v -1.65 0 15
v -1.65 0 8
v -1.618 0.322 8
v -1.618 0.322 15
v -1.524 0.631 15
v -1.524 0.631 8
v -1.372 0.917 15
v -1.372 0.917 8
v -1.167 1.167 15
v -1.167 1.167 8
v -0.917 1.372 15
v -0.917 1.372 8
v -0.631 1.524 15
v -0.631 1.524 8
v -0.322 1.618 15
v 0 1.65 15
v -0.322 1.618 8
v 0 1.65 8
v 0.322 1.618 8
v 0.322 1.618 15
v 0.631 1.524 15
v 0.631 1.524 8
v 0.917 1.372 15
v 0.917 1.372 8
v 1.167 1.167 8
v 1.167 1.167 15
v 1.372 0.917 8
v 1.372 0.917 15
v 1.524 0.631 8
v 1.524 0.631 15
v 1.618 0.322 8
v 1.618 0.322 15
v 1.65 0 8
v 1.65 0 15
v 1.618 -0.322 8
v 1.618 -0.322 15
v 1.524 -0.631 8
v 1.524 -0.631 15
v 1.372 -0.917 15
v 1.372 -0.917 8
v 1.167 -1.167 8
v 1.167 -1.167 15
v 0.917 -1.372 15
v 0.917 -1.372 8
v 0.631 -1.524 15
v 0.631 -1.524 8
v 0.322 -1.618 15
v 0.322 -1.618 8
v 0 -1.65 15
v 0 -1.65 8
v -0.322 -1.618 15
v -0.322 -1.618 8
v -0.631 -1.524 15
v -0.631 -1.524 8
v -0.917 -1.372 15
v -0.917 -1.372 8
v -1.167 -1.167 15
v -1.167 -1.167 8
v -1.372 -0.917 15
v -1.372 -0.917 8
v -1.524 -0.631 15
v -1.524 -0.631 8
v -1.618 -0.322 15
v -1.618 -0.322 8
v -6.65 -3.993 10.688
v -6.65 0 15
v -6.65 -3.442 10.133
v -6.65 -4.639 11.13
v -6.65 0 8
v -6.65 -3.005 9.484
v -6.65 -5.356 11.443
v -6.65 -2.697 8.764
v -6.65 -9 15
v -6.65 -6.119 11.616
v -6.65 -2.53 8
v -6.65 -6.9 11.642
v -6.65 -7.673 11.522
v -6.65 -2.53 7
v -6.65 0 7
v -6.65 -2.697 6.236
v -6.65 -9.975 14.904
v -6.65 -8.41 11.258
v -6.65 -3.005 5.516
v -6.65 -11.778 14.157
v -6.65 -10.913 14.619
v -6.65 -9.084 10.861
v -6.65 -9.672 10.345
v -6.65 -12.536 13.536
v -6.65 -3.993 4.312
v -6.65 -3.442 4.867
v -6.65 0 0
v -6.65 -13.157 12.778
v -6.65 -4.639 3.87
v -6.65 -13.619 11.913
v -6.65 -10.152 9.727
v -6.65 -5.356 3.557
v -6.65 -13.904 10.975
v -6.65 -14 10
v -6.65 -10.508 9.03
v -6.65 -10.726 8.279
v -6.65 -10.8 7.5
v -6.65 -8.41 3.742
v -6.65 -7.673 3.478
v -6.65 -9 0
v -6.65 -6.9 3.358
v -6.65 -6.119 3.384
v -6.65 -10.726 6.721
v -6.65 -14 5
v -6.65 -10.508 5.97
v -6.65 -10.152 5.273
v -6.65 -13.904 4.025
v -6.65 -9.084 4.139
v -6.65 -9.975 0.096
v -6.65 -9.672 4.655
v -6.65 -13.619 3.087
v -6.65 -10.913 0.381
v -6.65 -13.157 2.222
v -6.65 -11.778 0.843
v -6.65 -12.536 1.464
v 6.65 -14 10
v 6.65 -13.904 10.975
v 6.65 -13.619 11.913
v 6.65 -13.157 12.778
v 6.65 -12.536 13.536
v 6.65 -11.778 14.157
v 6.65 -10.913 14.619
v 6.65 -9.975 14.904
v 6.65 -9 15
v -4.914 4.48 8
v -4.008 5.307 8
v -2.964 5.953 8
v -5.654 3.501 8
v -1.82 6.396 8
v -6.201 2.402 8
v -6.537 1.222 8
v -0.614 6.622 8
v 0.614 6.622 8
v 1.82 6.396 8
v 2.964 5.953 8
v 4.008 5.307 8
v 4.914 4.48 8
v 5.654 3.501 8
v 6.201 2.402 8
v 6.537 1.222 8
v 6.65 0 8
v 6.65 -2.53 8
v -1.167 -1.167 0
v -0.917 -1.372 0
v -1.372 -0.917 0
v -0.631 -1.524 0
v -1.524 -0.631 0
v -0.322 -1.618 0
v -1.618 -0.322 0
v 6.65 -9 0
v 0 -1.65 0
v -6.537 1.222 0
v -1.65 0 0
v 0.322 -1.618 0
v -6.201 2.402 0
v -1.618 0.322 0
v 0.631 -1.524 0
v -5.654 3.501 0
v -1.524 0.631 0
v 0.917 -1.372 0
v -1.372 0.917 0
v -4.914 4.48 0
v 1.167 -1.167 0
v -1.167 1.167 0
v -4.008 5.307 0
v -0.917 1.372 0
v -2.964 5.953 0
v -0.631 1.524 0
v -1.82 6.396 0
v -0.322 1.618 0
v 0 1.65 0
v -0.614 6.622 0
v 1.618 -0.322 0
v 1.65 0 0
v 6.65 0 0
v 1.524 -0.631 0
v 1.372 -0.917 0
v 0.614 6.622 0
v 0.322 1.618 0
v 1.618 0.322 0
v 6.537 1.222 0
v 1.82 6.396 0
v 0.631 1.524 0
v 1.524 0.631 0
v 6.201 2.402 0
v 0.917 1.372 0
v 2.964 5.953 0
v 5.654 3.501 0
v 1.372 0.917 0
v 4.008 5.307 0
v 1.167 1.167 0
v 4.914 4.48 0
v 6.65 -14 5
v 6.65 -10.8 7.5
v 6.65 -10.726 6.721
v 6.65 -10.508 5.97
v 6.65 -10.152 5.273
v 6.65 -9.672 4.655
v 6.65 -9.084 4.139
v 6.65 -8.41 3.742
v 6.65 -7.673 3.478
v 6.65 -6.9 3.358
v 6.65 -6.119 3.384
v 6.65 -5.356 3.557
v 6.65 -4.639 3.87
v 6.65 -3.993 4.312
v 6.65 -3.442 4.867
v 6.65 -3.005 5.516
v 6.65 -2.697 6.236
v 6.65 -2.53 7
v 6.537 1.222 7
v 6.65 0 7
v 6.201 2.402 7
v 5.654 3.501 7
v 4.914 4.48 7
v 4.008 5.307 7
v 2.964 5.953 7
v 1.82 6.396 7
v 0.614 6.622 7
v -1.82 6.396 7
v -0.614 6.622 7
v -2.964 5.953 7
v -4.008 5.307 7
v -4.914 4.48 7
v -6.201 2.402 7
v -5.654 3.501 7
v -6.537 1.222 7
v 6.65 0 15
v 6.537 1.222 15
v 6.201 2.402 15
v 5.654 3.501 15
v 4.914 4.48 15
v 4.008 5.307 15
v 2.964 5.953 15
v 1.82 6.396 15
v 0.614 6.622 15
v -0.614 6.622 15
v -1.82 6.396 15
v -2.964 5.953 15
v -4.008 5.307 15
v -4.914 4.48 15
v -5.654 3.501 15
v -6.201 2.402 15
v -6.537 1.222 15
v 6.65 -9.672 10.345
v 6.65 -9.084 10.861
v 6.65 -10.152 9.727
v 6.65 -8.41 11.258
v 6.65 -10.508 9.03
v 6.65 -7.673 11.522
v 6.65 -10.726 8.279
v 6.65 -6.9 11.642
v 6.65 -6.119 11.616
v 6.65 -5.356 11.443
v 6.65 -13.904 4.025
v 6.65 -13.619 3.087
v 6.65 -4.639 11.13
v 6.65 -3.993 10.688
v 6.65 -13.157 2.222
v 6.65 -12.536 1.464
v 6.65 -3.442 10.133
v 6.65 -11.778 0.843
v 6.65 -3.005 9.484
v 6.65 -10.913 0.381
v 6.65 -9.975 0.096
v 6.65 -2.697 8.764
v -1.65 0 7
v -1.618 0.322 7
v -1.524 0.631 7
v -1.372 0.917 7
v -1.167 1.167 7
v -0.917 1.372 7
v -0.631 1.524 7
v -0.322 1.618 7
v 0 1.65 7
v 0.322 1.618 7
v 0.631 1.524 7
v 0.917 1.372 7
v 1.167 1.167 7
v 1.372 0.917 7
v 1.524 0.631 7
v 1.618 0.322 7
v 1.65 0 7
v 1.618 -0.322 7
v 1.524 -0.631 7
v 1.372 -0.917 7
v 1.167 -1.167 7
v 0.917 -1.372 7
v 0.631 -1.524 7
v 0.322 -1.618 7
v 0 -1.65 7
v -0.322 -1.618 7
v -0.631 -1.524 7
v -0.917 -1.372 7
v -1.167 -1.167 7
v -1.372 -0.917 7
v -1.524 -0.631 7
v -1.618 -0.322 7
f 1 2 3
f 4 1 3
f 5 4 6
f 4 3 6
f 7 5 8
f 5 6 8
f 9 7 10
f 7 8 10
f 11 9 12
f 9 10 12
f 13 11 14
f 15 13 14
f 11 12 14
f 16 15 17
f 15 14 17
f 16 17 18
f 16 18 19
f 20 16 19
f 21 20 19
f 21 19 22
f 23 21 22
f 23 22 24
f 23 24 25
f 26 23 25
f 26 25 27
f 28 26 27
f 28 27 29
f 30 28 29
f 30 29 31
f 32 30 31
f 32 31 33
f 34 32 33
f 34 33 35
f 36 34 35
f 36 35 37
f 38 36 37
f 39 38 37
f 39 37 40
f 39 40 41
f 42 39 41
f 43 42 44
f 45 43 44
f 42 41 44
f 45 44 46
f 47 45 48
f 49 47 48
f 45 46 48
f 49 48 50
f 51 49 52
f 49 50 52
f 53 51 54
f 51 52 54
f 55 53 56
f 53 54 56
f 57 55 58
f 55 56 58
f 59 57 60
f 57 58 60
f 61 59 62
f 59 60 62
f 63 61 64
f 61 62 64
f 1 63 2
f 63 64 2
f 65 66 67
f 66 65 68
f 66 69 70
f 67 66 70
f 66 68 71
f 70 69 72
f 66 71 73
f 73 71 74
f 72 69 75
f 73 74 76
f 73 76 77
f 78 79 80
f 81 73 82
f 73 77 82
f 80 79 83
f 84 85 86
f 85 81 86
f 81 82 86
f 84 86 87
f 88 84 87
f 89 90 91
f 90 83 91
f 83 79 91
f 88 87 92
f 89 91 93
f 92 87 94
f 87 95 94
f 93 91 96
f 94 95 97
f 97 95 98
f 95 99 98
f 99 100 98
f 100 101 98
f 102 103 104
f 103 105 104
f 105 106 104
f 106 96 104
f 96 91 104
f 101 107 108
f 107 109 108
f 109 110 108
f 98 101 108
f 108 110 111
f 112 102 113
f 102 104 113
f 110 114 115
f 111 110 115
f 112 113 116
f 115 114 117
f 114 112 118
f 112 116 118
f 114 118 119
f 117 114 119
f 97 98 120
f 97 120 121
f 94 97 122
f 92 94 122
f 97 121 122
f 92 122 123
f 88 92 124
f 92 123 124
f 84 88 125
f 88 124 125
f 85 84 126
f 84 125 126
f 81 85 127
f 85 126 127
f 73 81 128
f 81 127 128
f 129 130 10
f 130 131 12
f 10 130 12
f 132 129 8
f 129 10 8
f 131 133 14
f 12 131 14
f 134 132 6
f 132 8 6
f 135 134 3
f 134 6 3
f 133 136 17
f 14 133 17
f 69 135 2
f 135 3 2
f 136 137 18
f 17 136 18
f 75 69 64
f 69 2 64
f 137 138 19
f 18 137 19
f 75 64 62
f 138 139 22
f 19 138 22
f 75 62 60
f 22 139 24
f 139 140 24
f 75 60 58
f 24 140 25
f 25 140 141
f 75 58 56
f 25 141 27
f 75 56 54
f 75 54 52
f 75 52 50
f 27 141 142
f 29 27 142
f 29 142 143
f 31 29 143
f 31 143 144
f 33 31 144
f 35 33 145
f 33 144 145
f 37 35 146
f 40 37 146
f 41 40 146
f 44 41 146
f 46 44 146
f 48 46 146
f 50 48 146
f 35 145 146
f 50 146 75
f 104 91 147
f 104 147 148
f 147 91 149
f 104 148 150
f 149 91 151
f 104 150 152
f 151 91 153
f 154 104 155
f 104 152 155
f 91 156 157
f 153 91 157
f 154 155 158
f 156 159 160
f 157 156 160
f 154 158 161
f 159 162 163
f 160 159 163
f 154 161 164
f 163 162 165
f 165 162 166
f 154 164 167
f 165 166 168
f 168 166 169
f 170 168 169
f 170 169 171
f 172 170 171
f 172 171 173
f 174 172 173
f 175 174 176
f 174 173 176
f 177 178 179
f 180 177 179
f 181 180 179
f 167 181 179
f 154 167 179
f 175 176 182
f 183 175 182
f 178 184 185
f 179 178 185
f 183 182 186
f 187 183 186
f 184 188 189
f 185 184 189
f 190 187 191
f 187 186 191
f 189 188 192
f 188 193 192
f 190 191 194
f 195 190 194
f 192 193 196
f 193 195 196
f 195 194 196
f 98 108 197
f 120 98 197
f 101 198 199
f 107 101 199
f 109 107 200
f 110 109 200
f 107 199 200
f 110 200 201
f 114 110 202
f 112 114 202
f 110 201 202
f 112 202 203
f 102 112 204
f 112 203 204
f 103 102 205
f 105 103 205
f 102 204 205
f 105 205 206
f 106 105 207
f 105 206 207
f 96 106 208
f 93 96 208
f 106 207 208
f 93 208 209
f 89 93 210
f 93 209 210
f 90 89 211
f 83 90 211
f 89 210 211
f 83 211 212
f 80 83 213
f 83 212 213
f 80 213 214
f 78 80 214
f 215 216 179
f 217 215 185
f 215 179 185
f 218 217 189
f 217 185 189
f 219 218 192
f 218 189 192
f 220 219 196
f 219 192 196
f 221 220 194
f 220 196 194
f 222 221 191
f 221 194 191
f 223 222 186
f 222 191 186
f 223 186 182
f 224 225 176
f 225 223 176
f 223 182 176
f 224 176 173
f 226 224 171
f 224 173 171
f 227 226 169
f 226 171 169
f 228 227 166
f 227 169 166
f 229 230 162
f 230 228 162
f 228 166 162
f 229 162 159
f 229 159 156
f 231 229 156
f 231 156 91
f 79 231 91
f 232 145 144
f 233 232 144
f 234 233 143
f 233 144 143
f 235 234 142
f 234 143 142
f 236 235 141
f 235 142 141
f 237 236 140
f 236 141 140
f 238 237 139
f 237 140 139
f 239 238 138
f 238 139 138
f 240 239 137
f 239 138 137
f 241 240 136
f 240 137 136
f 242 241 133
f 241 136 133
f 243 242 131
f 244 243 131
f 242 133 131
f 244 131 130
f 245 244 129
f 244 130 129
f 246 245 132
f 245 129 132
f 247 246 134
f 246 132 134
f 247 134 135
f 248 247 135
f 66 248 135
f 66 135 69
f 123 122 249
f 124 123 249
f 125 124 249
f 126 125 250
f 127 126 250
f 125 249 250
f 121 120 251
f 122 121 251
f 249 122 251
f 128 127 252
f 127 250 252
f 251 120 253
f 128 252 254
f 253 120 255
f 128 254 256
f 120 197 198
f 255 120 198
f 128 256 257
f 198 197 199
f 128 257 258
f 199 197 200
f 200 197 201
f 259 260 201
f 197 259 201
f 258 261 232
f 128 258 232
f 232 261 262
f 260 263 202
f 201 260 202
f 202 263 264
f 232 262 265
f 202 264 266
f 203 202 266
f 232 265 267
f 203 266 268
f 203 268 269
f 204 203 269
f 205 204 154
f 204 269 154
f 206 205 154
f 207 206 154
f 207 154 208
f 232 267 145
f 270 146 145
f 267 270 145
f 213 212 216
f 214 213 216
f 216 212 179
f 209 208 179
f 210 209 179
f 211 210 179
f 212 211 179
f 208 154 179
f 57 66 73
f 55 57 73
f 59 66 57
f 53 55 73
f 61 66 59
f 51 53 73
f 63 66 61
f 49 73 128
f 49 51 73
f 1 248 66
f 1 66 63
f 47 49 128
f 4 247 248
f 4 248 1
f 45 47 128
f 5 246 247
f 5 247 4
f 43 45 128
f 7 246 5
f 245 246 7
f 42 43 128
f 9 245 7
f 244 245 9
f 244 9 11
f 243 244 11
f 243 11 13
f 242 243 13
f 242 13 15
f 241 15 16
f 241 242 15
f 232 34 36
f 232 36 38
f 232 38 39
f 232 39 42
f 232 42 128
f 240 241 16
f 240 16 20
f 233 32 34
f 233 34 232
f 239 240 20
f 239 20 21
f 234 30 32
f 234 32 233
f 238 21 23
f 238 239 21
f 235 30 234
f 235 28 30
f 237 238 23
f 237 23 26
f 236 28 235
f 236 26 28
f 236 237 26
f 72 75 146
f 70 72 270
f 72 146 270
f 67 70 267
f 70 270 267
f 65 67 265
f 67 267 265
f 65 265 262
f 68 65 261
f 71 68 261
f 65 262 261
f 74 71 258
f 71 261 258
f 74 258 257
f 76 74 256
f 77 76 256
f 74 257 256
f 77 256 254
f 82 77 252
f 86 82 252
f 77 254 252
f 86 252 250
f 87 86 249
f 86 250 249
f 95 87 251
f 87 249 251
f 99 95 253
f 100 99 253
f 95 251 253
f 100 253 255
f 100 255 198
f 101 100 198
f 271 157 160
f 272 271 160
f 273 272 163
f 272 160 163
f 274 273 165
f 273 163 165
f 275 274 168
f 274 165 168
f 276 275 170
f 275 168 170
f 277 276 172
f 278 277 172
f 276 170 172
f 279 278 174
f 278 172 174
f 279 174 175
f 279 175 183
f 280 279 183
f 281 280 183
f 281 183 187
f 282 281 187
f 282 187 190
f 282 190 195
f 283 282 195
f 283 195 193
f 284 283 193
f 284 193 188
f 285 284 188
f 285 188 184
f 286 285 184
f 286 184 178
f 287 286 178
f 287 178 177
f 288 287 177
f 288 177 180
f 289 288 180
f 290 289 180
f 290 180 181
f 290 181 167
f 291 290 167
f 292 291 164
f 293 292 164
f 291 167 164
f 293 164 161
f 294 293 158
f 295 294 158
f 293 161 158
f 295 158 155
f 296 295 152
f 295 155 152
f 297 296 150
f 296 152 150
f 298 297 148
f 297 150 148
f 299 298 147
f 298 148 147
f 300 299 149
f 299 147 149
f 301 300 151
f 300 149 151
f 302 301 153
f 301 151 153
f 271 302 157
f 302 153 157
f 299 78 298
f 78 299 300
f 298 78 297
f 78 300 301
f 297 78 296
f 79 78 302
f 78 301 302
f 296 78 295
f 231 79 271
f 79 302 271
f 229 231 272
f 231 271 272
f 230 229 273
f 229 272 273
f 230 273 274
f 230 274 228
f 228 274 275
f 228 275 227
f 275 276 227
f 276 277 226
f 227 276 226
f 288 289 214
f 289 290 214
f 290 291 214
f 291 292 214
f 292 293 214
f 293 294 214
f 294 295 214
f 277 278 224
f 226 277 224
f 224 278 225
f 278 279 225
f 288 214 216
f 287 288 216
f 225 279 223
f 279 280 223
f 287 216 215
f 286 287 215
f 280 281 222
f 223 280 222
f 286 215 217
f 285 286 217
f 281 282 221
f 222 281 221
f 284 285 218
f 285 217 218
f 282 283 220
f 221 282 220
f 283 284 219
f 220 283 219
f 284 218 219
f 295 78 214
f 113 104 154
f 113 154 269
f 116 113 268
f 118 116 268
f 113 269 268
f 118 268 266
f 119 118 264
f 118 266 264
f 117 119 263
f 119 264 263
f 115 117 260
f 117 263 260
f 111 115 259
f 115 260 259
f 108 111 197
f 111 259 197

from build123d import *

# Parameters (mm, degrees)
F1_DEPTH = 15
F2_W     = 3.3
F2_H     = 1
F2_W_2   = 6.2084717173
F3_DEPTH = 13.301
F4_R     = 5


with BuildPart() as f1:
    # F0 (on Top) → F1 (new body)
    with BuildSketch(Plane.XY):
        with BuildLine():
            Line((6.65, 0), (1.65, 0))
            ThreePointArc((1.65, 0), (0, -1.65), (-1.65, 0))
            Line((-1.65, 0), (-6.65, 0))
            ThreePointArc((-6.65, 0), (0, -6.65), (6.65, 0))
        make_face()
        with BuildLine():
            ThreePointArc((-1.65, 0), (0, 1.65), (1.65, 0))
            Line((1.65, 0), (6.65, 0))
            ThreePointArc((6.65, 0), (0, 6.65), (-6.65, 0))
            Line((-6.65, 0), (-1.65, 0))
        make_face()
        with BuildLine():
            Line((6.65, -14), (6.65, 0))
            ThreePointArc((6.65, 0), (0, -6.65), (-6.65, 0))
            Line((-6.65, 0), (-6.65, -14))
            Line((-6.65, -14), (6.65, -14))
        make_face()
    extrude(amount=F1_DEPTH)

    # F2 (on face) → F3 (cut, through all)
    with BuildSketch(Plane.YZ.offset(6.65)):
        with BuildLine():
            ThreePointArc((-2.530230589, 7), (-2.5075645415, 7.2495434726), (-2.5, 7.5))
            ThreePointArc((-2.5, 7.5), (-2.5075645415, 7.7504565274), (-2.530230589, 8))
            Line((-2.530230589, 8), (-2.530230589, 7.5))
            Line((-2.530230589, 7.5), (-2.530230589, 7))
        make_face()
        with BuildLine():
            ThreePointArc((-2.530230589, 8), (-2.5075645415, 7.7504565274), (-2.5, 7.5))
            ThreePointArc((-2.5, 7.5), (-2.5075645415, 7.2495434726), (-2.530230589, 7))
            Line((-2.530230589, 7), (-1.65, 7))
            Line((-1.65, 7), (-1.65, 8))
            Line((-1.65, 8), (-2.530230589, 8))
        make_face()
        with BuildLine():
            Line((-2.530230589, 7.5), (-2.530230589, 8))
            ThreePointArc((-2.530230589, 8), (-6.9004565274, 11.6424354585), (-10.8, 7.5))
            Line((-10.8, 7.5), (-2.530230589, 7.5))
        make_face()
        with BuildLine():
            ThreePointArc((-10.8, 7.5), (-6.9004565274, 3.3575645415), (-2.530230589, 7))
            Line((-2.530230589, 7), (-2.530230589, 7.5))
            Line((-2.530230589, 7.5), (-10.8, 7.5))
        make_face()
        with Locations((0, 7.5)):
            Rectangle(F2_W, F2_H)
        with Locations((4.7542358587, 7.5)):
            Rectangle(F2_W_2, F2_H)
    extrude(amount=-F3_DEPTH, mode=Mode.SUBTRACT)

    # F4
    f4_edges = [f1.edges().sort_by_distance(p)[0] for p in [
        (0, -14, 15),
        (0, -14, 0),
    ]]
    fillet(f4_edges, radius=F4_R)


solid = f1.part
